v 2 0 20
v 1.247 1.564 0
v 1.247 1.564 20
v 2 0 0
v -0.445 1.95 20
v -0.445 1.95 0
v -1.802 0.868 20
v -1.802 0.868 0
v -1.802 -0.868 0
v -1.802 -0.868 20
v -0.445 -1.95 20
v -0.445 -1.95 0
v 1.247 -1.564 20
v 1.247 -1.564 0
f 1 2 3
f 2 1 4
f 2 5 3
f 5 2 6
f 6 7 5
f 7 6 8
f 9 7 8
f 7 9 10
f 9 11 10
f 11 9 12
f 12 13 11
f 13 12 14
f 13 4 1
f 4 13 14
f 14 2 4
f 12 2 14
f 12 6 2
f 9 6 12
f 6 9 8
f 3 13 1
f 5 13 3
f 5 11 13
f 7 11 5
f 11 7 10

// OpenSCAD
module side_cylinder() {
    cylinder(h=20, r=2);
}

// call module when run directly
side_cylinder();
